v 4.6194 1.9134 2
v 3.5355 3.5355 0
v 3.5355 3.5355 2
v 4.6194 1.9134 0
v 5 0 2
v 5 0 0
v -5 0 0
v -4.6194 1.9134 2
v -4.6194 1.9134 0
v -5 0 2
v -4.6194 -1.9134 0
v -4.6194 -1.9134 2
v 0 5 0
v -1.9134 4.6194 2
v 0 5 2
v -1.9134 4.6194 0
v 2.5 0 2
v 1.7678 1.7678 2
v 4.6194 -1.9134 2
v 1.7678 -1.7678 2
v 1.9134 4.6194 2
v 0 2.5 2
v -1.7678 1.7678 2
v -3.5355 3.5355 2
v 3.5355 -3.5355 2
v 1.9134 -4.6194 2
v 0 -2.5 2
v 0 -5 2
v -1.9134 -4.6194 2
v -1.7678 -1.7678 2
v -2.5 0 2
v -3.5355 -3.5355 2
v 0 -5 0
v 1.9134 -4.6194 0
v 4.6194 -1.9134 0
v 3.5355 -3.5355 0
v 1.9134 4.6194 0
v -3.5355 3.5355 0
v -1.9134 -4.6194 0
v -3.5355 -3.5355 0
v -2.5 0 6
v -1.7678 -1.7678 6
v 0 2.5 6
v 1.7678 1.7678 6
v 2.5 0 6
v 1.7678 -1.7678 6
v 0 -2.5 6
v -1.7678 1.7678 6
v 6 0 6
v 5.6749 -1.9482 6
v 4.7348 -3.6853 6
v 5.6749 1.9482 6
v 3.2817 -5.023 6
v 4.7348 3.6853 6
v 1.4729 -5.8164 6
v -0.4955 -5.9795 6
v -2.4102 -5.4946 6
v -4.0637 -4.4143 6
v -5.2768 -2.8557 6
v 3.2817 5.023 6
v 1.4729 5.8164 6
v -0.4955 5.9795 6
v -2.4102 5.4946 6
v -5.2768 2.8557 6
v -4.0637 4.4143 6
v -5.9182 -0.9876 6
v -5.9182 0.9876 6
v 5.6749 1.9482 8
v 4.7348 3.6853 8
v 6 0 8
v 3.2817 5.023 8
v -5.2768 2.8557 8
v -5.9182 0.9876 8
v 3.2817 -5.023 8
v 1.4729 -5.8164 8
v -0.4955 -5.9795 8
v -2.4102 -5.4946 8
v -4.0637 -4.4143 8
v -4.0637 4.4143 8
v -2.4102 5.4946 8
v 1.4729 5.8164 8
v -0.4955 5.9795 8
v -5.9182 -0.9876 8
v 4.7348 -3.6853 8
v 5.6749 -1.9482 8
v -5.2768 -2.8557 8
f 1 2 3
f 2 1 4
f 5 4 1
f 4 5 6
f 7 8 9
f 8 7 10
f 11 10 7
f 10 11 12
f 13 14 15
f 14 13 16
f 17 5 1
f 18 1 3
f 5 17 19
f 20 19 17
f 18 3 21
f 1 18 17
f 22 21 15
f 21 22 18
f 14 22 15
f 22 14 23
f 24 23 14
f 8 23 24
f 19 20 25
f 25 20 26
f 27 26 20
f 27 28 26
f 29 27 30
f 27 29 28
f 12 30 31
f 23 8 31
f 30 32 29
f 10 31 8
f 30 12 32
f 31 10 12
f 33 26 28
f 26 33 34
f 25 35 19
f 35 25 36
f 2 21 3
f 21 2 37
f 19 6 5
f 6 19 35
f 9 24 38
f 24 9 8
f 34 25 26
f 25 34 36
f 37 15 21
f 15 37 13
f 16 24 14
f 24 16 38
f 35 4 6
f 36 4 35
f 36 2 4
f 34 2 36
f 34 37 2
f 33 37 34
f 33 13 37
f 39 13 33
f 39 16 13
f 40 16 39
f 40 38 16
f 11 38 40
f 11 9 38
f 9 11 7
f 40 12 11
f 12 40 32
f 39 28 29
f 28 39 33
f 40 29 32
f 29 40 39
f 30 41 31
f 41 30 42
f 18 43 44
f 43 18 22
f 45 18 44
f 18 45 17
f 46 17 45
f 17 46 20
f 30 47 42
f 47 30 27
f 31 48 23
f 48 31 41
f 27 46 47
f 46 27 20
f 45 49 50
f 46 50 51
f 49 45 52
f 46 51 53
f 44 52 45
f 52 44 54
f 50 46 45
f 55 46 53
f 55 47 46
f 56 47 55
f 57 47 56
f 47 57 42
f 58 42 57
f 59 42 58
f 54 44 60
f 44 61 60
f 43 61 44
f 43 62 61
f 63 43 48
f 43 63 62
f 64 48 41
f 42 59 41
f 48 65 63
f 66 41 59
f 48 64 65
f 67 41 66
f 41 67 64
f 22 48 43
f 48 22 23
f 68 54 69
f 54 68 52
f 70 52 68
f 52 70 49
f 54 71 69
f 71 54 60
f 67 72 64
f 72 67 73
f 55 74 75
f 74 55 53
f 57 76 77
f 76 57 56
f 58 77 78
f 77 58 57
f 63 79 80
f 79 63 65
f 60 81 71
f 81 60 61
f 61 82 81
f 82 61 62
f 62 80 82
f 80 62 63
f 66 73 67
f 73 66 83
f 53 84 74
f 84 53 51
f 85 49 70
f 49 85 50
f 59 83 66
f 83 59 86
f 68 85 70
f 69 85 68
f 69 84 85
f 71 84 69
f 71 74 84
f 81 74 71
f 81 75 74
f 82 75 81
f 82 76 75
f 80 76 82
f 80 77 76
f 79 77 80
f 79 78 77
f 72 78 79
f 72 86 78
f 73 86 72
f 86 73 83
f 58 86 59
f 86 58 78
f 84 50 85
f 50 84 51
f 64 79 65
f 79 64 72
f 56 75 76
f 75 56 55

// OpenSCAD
translate([0,0,0])cylinder(d=10,h=2);
translate([0,0,2])cylinder(d=5,h=4);
translate([0,0,6])cylinder(d=12,h=2);
